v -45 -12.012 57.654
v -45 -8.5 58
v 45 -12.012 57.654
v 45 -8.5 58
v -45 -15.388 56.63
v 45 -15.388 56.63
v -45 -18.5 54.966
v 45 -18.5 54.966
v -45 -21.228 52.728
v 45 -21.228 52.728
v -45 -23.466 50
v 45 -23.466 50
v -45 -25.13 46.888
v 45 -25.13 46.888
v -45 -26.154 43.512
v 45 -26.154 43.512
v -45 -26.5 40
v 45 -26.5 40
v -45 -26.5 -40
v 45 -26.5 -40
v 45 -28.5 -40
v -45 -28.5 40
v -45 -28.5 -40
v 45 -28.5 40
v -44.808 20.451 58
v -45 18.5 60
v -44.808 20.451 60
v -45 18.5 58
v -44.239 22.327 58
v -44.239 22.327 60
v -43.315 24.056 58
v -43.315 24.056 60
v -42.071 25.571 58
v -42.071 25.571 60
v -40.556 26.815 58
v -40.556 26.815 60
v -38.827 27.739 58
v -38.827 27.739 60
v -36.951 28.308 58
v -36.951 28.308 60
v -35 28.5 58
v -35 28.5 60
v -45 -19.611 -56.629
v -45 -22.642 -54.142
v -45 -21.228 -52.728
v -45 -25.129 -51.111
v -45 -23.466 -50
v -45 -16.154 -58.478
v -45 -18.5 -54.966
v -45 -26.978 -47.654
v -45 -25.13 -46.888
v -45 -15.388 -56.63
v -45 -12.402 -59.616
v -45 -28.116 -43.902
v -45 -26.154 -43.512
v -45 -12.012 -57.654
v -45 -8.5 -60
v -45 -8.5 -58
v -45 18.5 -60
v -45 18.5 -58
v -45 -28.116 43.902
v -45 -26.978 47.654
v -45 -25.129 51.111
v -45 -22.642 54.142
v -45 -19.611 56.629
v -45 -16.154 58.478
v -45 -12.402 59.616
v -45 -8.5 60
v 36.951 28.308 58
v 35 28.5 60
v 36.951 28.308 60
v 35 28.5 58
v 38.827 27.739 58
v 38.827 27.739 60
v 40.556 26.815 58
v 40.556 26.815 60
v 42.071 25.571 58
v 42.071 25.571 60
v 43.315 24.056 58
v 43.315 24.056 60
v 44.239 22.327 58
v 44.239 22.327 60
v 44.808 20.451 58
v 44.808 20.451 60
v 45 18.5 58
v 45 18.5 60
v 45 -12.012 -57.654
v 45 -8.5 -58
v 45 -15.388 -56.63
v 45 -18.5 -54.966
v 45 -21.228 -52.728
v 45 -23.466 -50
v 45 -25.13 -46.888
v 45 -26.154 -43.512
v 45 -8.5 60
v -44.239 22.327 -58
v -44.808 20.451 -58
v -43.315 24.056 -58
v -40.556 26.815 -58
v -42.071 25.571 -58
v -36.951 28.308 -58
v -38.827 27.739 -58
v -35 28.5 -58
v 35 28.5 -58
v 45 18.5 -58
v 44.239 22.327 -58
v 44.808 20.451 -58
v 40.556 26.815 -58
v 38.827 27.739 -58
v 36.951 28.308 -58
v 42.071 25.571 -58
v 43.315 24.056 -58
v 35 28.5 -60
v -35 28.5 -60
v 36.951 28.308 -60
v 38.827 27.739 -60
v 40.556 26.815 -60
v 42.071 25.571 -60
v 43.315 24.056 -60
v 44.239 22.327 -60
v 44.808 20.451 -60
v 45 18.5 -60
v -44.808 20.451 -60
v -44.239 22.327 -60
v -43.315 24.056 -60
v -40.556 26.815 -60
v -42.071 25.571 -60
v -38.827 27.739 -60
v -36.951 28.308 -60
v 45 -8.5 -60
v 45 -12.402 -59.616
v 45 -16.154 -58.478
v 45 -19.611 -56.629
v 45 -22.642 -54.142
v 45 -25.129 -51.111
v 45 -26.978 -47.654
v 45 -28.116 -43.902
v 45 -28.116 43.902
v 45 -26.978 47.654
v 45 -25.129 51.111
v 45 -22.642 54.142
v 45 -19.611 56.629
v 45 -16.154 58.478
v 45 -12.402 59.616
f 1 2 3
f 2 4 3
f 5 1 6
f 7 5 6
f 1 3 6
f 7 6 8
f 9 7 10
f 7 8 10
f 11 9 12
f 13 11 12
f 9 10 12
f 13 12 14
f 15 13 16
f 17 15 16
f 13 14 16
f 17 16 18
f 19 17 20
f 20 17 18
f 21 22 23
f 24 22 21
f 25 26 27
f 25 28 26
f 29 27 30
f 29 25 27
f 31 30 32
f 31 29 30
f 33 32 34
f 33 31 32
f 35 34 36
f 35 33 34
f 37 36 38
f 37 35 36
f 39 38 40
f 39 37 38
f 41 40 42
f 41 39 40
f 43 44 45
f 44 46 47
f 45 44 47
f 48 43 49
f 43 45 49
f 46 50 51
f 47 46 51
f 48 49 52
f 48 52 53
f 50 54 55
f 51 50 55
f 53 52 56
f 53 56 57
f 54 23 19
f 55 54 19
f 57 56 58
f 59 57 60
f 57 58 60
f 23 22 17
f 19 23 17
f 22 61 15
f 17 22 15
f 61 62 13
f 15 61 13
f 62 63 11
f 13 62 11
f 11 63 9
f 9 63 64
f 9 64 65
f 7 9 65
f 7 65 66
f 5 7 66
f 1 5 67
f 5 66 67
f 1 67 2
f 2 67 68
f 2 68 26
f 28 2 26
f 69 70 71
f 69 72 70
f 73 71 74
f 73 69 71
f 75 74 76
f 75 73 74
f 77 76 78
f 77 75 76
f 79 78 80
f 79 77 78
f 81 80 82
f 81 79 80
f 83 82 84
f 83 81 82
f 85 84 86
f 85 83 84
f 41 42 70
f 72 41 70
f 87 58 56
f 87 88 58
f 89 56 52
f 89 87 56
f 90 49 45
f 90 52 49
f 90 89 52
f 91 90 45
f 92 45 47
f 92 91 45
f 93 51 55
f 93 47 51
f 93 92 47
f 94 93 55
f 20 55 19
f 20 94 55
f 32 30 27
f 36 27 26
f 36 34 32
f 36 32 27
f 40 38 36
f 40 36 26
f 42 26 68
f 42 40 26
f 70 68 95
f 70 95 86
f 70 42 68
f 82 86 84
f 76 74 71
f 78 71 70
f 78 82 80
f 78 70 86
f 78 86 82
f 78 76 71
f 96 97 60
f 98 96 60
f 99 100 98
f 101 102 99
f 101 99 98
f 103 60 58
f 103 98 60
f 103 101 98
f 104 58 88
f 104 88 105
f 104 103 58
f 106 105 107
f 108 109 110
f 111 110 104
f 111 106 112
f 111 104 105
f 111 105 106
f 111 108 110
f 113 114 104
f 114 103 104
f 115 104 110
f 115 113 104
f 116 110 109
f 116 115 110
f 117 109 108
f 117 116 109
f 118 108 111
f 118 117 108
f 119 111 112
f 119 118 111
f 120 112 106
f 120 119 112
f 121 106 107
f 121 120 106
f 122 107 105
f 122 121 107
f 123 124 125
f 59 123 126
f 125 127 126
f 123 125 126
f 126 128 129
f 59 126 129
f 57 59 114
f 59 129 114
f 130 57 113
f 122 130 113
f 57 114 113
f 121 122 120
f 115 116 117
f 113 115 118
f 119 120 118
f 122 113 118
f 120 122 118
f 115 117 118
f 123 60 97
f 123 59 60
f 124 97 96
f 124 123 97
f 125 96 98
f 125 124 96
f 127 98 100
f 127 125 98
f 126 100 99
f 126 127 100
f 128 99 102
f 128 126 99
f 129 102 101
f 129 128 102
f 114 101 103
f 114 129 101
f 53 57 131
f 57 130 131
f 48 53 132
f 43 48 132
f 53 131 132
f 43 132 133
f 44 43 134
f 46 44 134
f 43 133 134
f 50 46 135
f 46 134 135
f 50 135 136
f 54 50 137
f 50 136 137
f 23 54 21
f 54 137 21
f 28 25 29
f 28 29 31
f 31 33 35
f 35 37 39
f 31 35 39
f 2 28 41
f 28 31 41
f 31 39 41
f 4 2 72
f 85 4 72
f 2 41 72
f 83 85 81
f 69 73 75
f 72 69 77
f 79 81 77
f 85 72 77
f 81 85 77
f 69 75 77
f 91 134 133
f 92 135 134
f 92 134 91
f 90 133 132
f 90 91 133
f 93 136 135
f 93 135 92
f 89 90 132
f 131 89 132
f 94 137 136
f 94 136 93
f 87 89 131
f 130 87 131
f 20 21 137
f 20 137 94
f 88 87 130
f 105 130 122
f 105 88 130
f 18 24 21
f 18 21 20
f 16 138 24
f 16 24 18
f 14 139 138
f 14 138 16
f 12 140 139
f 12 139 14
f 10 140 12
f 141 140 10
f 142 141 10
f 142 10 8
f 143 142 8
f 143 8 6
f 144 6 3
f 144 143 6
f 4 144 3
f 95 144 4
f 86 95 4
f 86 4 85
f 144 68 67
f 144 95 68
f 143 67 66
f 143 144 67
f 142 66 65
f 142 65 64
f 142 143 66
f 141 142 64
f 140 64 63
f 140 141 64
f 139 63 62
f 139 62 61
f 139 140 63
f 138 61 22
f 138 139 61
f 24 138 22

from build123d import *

# Parameters (mm, degrees)
SKETCH1_W           = 90
SKETCH1_H           = 57
BOSS_EXTRUDE1_DEPTH = 60
FILLET1_R           = 20
SHELL1_T            = -2
FILLET2_R           = 10


with BuildPart() as part:
    # Sketch1 → Boss-Extrude1 (new, symmetric)
    with BuildSketch(Plane.XY):
        Rectangle(SKETCH1_W, SKETCH1_H)
    extrude(amount=BOSS_EXTRUDE1_DEPTH, both=True)

    # Fillet1
    fillet1_edges = [part.edges().sort_by_distance(p)[0] for p in [
        (0, -28.5, 60),
        (0, -28.5, -60),
    ]]
    fillet(fillet1_edges, radius=FILLET1_R)

    # Shell1
    shell1_openings = [part.faces().sort_by_distance(p)[0] for p in [
        (-45, 0.618740562, 0),
        (0, 28.5, 0),
        (45, 0.618740562, 0),
    ]]
    offset(amount=SHELL1_T, openings=shell1_openings, kind=Kind.INTERSECTION)

    # Fillet2
    fillet2_edges = [part.edges().sort_by_distance(p)[0] for p in [
        (-45, 28.5, -59),
        (45, 28.5, -59),
        (-45, 28.5, 59),
        (45, 28.5, 59),
    ]]
    fillet(fillet2_edges, radius=FILLET2_R)


solid = part.part
